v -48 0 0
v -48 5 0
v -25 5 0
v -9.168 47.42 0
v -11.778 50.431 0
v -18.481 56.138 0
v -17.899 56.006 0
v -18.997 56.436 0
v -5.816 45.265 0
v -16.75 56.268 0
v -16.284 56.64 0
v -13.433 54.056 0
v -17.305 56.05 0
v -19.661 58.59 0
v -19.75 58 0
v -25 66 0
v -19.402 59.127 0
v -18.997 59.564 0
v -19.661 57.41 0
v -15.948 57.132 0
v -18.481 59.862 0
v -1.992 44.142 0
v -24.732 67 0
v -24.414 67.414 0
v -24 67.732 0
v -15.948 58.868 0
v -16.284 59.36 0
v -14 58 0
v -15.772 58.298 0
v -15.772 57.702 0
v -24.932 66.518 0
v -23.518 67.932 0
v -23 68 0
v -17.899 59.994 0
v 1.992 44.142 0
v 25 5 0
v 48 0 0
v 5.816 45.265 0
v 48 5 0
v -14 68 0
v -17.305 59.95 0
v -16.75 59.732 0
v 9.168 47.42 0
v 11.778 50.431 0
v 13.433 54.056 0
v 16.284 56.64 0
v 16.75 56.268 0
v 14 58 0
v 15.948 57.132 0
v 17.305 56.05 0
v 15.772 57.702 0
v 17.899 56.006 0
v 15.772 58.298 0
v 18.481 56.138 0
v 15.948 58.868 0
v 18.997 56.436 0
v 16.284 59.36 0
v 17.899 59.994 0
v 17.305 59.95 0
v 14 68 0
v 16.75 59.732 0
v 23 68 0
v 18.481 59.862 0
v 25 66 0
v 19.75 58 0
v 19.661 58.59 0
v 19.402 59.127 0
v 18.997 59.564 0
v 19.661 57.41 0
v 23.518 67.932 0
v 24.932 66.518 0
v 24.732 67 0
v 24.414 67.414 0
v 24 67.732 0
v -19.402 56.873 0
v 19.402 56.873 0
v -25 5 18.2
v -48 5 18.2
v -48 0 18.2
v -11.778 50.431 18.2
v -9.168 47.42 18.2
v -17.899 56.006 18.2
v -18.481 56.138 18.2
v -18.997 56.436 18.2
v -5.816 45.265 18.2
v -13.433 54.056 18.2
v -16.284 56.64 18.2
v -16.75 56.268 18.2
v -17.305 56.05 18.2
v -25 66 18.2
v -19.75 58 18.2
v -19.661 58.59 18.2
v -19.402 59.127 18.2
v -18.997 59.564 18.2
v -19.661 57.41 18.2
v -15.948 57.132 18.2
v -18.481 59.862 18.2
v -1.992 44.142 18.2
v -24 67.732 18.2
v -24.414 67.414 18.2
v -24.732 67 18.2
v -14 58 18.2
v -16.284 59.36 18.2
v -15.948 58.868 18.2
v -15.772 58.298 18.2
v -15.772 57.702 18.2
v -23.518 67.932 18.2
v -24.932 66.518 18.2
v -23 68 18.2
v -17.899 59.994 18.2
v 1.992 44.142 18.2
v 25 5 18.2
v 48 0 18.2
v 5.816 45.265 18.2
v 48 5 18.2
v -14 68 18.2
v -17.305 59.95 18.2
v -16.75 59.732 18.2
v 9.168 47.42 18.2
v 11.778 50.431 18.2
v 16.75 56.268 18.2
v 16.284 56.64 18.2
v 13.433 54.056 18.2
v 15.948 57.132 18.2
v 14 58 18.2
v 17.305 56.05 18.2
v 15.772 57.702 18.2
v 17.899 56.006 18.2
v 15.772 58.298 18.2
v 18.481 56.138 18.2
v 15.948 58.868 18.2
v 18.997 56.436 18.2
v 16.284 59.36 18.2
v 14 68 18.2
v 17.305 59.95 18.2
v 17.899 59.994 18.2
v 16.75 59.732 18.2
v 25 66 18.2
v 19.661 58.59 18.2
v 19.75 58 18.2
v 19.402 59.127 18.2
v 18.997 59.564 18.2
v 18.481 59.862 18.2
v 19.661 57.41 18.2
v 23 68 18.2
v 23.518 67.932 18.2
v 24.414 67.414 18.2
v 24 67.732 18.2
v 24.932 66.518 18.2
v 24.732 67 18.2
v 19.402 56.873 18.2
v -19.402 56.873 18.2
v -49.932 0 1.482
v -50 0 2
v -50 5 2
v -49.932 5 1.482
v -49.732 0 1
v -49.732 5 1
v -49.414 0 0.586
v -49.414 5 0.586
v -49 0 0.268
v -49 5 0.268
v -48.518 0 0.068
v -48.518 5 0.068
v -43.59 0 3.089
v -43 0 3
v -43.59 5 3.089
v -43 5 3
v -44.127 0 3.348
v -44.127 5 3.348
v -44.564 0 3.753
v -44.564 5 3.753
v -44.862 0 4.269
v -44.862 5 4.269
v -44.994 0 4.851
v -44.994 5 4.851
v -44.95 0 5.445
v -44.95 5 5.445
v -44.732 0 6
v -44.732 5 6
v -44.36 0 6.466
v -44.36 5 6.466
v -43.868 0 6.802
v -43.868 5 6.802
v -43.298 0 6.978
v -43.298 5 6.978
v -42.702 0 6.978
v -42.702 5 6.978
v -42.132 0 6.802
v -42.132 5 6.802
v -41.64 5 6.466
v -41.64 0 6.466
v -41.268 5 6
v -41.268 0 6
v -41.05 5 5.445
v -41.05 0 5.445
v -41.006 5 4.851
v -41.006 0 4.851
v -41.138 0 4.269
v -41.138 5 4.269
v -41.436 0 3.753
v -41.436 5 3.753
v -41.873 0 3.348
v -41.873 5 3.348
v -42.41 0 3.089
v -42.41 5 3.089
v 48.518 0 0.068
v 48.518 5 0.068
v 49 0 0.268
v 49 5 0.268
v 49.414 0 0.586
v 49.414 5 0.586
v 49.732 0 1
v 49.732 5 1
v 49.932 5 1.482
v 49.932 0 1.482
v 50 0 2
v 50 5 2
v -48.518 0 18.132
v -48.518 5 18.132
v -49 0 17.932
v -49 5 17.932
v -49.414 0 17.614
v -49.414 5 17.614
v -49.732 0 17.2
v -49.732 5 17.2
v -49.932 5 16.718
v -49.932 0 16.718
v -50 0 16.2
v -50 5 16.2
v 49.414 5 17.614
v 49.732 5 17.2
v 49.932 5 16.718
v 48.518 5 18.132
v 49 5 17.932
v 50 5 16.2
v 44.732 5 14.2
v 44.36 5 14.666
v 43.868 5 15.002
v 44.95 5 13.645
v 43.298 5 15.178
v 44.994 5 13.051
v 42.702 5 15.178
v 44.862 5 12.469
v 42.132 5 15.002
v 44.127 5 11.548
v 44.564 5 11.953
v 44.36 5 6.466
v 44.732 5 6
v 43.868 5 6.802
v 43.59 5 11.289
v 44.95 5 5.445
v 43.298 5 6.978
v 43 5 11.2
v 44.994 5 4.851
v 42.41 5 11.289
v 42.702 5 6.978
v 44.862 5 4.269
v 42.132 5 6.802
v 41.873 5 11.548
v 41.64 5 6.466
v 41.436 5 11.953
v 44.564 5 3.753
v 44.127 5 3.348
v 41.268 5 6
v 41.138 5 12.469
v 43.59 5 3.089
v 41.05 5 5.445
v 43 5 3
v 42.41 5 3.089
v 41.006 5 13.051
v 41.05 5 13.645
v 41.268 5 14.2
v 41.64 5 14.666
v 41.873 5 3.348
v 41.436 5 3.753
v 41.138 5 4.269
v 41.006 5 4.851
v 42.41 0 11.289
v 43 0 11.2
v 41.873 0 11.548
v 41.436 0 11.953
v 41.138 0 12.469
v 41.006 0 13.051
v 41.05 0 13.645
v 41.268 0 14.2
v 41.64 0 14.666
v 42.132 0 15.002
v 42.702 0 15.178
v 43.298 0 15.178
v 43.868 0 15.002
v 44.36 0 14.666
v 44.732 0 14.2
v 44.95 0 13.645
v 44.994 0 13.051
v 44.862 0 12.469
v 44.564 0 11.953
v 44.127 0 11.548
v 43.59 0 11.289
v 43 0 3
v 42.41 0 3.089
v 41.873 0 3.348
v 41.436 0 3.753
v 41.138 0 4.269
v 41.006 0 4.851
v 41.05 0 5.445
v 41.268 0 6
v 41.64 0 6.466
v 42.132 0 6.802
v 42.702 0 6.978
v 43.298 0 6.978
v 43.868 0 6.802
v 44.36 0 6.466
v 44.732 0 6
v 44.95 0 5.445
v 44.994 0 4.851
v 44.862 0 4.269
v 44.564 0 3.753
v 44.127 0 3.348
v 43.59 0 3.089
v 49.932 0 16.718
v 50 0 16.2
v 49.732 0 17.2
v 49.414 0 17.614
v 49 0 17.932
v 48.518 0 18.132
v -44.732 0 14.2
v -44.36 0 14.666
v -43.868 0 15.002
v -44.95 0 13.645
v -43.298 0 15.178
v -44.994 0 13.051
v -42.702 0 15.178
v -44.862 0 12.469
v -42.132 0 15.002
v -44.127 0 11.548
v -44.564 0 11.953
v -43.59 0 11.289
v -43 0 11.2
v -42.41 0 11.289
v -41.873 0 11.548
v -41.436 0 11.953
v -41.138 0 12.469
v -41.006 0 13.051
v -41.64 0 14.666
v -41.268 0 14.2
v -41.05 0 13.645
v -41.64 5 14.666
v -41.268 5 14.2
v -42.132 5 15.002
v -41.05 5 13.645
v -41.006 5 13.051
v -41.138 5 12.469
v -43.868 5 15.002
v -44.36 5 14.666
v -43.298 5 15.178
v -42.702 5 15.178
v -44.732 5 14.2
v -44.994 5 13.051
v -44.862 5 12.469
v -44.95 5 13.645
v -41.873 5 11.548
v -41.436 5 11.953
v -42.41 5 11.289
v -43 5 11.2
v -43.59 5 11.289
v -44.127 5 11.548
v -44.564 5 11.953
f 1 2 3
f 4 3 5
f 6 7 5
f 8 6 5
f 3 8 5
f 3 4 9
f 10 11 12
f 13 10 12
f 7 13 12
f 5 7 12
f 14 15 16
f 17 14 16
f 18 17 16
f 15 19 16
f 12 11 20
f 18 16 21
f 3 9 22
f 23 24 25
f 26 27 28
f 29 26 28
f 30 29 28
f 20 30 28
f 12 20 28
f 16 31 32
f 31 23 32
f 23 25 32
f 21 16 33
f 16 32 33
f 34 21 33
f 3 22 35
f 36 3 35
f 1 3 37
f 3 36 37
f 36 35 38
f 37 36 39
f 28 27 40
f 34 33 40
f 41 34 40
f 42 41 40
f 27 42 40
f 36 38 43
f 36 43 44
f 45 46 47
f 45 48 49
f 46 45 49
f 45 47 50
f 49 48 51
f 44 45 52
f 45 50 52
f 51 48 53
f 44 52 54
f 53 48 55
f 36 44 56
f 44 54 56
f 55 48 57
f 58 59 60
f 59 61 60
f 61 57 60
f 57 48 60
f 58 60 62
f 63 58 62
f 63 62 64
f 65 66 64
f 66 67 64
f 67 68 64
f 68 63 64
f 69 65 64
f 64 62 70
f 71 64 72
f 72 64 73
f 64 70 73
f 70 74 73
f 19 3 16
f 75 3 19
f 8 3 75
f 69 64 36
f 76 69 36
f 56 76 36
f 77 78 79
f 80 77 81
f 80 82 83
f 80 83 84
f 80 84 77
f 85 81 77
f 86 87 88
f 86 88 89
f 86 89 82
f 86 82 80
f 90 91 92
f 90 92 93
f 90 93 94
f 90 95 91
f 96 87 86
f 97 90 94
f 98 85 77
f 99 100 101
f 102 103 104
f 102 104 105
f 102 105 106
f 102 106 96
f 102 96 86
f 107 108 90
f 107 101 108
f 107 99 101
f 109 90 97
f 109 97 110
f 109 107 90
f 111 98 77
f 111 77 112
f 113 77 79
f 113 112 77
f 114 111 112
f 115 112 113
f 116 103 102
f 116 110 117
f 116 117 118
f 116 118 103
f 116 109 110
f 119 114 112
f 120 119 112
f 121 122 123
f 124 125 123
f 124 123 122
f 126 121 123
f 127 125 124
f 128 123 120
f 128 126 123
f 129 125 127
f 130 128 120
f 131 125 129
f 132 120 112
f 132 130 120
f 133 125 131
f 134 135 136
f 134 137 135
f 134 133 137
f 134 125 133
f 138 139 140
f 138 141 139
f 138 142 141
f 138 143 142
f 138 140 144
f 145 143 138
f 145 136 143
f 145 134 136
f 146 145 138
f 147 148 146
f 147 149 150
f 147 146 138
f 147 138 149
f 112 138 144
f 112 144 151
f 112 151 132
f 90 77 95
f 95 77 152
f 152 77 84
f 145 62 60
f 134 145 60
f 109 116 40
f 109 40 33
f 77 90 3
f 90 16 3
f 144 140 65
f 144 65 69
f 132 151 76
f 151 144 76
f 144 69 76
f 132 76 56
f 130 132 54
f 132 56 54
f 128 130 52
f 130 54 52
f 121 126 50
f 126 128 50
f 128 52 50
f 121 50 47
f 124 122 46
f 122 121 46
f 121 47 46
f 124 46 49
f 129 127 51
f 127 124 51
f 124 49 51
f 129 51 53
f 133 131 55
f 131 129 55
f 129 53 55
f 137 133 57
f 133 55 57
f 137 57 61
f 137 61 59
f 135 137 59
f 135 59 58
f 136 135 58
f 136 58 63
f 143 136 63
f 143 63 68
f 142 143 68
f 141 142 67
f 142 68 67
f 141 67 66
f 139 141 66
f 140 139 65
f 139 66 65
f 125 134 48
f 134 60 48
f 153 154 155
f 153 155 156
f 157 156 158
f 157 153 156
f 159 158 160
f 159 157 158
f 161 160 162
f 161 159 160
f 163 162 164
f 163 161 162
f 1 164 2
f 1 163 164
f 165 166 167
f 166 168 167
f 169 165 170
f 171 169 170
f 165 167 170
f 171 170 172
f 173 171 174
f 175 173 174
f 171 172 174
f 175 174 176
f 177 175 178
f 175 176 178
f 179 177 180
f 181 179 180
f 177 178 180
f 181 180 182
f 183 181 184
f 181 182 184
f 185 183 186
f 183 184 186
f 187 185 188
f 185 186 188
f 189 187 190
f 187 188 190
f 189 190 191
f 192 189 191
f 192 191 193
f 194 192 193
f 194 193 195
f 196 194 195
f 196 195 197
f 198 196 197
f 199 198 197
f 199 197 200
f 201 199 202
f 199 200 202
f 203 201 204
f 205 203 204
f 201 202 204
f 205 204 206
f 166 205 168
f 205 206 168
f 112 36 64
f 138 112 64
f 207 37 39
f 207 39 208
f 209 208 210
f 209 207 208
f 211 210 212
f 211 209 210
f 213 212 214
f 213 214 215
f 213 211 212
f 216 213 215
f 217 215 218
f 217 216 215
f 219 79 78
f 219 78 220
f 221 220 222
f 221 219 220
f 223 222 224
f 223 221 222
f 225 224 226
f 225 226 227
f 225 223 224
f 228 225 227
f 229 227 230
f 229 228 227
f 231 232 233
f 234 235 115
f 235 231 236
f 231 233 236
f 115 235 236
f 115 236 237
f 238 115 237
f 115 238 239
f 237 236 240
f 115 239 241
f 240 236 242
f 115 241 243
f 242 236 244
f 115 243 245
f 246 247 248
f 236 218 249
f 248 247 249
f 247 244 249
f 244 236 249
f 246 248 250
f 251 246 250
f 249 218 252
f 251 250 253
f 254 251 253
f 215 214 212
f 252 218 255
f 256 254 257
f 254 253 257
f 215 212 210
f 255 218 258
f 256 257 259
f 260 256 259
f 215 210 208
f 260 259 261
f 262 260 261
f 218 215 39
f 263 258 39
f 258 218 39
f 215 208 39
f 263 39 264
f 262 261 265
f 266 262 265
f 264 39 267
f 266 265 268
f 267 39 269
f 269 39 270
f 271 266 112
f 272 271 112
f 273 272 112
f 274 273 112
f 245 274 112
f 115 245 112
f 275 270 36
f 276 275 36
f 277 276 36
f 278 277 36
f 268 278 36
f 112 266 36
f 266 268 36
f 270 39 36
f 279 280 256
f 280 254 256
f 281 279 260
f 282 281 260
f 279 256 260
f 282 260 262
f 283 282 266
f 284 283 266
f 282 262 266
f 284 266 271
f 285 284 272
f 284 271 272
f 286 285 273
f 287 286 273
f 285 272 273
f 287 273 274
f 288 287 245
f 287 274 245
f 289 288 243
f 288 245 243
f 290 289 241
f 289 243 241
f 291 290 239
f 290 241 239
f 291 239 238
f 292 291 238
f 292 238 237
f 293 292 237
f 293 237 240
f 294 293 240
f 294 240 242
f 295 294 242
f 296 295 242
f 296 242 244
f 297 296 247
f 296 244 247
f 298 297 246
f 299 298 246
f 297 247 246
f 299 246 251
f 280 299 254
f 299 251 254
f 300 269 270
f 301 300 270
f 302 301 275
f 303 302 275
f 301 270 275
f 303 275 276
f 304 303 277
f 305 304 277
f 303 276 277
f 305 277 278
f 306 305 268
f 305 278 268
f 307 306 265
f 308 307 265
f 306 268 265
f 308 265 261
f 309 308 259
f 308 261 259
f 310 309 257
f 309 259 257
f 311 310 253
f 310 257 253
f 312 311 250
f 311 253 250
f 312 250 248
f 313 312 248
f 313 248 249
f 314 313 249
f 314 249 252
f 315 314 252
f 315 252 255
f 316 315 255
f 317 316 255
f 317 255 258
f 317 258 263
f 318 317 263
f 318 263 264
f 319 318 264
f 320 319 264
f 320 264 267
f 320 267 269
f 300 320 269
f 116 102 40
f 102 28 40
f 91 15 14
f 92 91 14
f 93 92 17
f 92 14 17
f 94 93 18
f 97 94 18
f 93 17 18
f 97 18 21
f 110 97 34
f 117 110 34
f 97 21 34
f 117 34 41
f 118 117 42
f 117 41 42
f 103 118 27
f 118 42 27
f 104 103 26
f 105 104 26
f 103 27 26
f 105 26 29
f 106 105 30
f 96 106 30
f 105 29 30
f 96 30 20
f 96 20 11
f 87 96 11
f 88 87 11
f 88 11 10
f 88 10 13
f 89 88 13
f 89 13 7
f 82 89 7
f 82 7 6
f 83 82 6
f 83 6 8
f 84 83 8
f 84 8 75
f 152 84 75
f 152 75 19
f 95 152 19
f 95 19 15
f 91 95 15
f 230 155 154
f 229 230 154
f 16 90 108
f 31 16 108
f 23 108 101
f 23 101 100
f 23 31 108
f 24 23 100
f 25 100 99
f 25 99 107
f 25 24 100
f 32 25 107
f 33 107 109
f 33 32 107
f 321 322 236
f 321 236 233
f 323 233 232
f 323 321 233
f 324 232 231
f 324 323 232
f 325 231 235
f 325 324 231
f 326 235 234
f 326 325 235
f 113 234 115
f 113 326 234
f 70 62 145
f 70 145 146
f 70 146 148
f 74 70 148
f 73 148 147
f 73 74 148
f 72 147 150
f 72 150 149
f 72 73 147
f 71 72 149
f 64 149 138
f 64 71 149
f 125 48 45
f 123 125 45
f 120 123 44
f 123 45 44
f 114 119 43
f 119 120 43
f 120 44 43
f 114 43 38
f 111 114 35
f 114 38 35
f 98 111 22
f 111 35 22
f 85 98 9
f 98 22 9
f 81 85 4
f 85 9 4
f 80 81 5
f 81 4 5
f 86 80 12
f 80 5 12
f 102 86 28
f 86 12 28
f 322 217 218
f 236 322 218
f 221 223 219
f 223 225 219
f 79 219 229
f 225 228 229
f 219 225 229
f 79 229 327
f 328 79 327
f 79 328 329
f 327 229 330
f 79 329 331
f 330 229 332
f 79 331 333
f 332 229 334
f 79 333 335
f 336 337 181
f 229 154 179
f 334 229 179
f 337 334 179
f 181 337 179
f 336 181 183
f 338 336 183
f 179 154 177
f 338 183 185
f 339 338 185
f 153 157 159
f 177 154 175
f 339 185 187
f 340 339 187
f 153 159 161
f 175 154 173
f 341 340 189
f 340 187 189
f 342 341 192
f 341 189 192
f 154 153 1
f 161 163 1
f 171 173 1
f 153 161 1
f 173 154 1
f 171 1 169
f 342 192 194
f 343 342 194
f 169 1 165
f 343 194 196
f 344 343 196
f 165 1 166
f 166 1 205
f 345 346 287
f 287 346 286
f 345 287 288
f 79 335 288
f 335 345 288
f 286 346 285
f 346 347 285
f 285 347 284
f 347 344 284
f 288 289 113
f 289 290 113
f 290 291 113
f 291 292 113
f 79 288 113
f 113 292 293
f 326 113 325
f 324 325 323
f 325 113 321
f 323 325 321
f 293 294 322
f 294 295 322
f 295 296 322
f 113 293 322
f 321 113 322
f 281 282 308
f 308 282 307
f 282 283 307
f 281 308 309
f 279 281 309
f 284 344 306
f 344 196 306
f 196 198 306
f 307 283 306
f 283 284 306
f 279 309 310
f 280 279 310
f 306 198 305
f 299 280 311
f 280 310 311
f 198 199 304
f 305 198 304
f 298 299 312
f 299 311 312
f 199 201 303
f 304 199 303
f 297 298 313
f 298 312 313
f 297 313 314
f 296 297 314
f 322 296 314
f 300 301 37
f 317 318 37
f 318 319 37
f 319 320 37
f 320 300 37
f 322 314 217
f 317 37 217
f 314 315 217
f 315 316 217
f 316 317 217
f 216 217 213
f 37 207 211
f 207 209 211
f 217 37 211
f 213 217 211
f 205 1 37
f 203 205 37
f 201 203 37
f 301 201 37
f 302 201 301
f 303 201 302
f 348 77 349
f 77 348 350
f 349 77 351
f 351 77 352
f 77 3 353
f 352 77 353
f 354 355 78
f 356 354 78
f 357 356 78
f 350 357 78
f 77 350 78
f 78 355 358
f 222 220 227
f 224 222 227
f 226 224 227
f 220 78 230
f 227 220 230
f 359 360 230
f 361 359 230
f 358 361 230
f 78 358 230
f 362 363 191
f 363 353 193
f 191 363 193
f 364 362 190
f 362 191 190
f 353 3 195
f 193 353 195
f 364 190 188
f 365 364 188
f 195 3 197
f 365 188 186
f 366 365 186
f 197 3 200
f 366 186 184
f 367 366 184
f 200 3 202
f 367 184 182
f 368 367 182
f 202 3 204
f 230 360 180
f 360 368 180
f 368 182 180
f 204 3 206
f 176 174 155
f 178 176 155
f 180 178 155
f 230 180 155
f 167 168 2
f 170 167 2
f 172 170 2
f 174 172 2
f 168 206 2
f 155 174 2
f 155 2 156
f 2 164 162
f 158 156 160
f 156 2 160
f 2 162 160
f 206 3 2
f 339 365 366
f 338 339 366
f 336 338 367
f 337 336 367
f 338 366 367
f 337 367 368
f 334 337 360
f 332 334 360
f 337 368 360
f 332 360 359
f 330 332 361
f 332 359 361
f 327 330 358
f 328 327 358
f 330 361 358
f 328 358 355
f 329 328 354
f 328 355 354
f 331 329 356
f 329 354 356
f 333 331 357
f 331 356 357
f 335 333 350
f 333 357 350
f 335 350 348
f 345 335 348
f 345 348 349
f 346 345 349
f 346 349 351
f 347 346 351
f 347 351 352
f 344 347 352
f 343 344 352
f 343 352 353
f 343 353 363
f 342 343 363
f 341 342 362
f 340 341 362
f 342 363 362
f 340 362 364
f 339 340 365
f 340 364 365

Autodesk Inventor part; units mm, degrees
ref_plane "YZ Plane" through (0, 0, 0) normal (1, 0, 0) x (0, 1, 0)
ref_plane "XZ Plane" through (0, 0, 0) normal (0, 1, 0) x (-1, 0, 0)
ref_plane "XY Plane" through (0, 0, 0) normal (0, 0, 1) x (1, 0, 0)
sketch "Sketch1" plane through (0, 0, 0) normal (0, 0, 1) x (1, 0, 0)
  line L0 (0, 65.5357) -> (0, 44) construction
  line L1 (0, 0) -> (50, 0)
  line L2 (50, 0) -> (50, 5)
  line L3 (50, 5) -> (25, 5)
  line L4 (25, 5) -> (25, 68)
  line L5 (25, 68) -> (14, 68)
  line L6 (14, 68) -> (14, 58)
  arc A0 (0, 44) -> (14, 58) centre (0, 58) ccw
  circle A1 centre (17.75, 58) radius 2
  line L7 (0, 44) -> (0, 0)
  point P0 (0, 50)
  dimension "d0" = 5
  dimension "d1" = 50
  dimension "d2" = 25
  dimension "d4" = 14
  dimension "d5" = 4
  dimension "d6" = 17.75
  dimension "d7" = 10
  dimension "d22" = 50
  dimension "d23" = 6
extrude "Extrusion1" add sketch "Sketch1" along normal blind 18.2
mirror "Mirror1" about plane through (0, 0, 0) normal (1, 0, 0) of "Extrusion1"
sketch "Sketch2" plane through (50, 0, 0) normal (0, -1, 0) x (1, 0, 0)
  line L0 (-75, 0) -> (-75, 18.2) projected
  line L1 (-25, 0) -> (-25, 18.2) projected
  line L2 (-100, 0) -> (-100, 18.2) projected
  line L3 (0, 0) -> (0, 18.2) projected
  line L4 (0, 18.2) -> (-100, 18.2) projected
  line L5 (-100, 0) -> (0, 0) projected
  point P0 (-50, 0)
  point P1 (-93, 13.2)
  point P2 (-93, 5)
  point P3 (-7, 5)
  point P4 (-7, 13.2)
  dimension "d10" = 7
  dimension "d11" = 7
  dimension "d12" = 5
  dimension "d13" = 5
hole "Hole1" at (-43, 0, 13.2) at (-43, 0, 5) at (43, 0, 5) at (43, 0, 13.2) direction (0, 1, 0) diameter 4 end through all
fillet "Fillet1" radius 2 6 edges at (-50, 2.5, 18.2) (-50, 2.5, 0) (50, 2.5, 0) (50, 2.5, 18.2) (25, 68, 9.1) (-25, 68, 9.1)
properties part number "STEPPER MOTOR MOUNT"
